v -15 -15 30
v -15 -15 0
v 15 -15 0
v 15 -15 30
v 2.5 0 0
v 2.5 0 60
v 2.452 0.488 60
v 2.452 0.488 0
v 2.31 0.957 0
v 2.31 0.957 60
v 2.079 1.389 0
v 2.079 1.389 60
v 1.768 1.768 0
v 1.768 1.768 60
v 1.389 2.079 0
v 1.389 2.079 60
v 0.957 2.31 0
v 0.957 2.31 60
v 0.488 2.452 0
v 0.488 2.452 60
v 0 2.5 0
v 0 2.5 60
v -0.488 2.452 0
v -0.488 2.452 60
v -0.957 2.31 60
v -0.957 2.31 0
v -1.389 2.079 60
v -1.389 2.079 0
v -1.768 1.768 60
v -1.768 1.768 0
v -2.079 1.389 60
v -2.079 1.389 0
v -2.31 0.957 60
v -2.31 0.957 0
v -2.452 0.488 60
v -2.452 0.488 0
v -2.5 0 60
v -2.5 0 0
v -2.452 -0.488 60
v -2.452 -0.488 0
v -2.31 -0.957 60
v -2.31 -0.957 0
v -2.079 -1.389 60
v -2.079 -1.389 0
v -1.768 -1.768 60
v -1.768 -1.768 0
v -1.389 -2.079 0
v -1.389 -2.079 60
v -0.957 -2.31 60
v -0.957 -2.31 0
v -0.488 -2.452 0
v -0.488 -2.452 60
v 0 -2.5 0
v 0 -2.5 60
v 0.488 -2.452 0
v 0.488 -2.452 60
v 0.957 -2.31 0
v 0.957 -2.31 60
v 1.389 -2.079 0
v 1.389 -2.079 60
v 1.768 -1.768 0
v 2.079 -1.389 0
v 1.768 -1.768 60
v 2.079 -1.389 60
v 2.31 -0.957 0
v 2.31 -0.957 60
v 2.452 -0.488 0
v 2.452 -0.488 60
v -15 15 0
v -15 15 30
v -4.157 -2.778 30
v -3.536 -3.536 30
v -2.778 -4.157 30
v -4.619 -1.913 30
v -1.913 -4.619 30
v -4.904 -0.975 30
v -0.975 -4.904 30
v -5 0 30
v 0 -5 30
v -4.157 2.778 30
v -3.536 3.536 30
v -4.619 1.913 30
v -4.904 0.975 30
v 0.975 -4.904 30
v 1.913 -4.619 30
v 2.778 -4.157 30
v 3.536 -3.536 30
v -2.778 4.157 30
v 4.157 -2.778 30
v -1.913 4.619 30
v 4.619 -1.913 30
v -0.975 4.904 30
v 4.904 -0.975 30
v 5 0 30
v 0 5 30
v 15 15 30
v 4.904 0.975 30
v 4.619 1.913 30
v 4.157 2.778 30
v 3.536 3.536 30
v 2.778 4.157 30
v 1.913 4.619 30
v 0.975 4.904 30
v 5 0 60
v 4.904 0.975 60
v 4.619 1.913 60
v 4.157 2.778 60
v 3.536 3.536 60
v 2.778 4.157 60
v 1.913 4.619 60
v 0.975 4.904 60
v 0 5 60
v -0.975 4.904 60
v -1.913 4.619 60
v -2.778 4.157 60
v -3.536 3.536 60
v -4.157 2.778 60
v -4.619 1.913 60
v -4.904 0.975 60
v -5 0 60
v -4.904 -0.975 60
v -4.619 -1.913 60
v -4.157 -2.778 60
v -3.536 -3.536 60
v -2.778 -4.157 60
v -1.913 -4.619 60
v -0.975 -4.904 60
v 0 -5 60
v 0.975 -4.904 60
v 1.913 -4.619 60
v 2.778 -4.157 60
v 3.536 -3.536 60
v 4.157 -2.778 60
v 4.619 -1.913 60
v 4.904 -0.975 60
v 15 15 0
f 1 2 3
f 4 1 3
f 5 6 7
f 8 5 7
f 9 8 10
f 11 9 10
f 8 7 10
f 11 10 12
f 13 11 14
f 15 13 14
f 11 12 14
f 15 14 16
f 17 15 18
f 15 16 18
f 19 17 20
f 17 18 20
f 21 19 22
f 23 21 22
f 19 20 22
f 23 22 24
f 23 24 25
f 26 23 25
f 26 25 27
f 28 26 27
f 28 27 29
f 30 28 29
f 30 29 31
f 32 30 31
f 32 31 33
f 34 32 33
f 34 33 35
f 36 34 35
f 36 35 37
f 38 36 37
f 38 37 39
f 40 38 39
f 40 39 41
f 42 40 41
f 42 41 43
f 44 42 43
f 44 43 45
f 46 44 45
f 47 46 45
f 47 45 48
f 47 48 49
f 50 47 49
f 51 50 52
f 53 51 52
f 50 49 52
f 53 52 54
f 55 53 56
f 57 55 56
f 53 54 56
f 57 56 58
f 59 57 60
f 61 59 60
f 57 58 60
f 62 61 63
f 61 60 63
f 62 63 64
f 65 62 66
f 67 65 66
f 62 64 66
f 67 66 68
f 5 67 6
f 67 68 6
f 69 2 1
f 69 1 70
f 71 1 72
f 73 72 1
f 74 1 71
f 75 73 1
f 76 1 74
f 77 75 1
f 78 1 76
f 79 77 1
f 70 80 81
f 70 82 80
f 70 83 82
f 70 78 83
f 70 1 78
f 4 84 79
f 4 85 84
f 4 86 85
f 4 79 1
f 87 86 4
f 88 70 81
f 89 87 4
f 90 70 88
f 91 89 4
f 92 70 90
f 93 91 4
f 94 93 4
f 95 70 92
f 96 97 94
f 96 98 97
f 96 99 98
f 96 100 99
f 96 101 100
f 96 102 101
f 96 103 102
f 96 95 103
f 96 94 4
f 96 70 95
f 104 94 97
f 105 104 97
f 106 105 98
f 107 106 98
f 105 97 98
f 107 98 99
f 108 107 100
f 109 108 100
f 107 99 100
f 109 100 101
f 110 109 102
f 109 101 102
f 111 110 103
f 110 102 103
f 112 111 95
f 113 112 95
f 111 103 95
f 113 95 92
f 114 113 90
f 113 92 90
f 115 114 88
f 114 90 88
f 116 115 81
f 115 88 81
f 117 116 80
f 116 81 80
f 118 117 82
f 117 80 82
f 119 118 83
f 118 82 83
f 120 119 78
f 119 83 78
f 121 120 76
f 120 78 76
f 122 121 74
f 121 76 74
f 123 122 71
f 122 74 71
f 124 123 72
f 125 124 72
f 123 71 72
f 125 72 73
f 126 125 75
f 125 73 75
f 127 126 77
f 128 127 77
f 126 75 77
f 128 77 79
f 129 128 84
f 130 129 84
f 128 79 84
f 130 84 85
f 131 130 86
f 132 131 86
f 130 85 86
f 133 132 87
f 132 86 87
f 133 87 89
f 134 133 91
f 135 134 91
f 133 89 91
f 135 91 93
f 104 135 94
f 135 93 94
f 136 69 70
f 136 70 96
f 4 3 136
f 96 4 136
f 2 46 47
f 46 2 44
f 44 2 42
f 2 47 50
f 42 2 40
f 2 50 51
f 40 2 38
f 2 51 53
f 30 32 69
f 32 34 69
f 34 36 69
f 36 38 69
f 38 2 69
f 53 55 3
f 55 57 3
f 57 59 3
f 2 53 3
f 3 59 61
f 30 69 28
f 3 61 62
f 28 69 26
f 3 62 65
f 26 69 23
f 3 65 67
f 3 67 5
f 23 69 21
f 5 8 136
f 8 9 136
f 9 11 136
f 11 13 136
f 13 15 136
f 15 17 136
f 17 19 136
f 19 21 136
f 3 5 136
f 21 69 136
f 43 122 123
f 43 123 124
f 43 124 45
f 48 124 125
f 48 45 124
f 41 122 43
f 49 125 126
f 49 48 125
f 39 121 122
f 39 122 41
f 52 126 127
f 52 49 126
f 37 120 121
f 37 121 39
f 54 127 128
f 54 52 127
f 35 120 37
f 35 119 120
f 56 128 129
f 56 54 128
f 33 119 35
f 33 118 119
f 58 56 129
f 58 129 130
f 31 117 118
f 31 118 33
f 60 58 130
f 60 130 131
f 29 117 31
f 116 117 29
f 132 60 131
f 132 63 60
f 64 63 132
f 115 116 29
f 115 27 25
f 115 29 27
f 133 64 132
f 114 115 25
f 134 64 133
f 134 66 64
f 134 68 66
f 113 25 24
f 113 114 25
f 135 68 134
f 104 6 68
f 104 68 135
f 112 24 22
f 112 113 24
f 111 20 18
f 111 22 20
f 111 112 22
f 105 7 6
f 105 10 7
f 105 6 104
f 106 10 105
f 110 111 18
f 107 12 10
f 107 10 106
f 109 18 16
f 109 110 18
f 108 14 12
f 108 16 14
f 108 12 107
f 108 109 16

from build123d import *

# Parameters (mm, degrees)
F0_W     = 30
F0_H     = 30
F1_DEPTH = 30
F2_R     = 5
F3_DEPTH = 30
F4_R     = 2.5
F5_DEPTH = 60.001


with BuildPart() as f1:
    # F0 (on Top) → F1 (new body)
    with BuildSketch(Plane.XY):
        Rectangle(F0_W, F0_H)
    extrude(amount=F1_DEPTH)

    # F2 (on face) → F3 (join)
    with BuildSketch(Plane.XY.offset(30)):
        Circle(F2_R)
    extrude(amount=F3_DEPTH)

    # F4 (on face) → F5 (cut, through all)
    with BuildSketch(Plane.XY.offset(60)):
        Circle(F4_R)
    extrude(amount=-F5_DEPTH, mode=Mode.SUBTRACT)


solid = f1.part
